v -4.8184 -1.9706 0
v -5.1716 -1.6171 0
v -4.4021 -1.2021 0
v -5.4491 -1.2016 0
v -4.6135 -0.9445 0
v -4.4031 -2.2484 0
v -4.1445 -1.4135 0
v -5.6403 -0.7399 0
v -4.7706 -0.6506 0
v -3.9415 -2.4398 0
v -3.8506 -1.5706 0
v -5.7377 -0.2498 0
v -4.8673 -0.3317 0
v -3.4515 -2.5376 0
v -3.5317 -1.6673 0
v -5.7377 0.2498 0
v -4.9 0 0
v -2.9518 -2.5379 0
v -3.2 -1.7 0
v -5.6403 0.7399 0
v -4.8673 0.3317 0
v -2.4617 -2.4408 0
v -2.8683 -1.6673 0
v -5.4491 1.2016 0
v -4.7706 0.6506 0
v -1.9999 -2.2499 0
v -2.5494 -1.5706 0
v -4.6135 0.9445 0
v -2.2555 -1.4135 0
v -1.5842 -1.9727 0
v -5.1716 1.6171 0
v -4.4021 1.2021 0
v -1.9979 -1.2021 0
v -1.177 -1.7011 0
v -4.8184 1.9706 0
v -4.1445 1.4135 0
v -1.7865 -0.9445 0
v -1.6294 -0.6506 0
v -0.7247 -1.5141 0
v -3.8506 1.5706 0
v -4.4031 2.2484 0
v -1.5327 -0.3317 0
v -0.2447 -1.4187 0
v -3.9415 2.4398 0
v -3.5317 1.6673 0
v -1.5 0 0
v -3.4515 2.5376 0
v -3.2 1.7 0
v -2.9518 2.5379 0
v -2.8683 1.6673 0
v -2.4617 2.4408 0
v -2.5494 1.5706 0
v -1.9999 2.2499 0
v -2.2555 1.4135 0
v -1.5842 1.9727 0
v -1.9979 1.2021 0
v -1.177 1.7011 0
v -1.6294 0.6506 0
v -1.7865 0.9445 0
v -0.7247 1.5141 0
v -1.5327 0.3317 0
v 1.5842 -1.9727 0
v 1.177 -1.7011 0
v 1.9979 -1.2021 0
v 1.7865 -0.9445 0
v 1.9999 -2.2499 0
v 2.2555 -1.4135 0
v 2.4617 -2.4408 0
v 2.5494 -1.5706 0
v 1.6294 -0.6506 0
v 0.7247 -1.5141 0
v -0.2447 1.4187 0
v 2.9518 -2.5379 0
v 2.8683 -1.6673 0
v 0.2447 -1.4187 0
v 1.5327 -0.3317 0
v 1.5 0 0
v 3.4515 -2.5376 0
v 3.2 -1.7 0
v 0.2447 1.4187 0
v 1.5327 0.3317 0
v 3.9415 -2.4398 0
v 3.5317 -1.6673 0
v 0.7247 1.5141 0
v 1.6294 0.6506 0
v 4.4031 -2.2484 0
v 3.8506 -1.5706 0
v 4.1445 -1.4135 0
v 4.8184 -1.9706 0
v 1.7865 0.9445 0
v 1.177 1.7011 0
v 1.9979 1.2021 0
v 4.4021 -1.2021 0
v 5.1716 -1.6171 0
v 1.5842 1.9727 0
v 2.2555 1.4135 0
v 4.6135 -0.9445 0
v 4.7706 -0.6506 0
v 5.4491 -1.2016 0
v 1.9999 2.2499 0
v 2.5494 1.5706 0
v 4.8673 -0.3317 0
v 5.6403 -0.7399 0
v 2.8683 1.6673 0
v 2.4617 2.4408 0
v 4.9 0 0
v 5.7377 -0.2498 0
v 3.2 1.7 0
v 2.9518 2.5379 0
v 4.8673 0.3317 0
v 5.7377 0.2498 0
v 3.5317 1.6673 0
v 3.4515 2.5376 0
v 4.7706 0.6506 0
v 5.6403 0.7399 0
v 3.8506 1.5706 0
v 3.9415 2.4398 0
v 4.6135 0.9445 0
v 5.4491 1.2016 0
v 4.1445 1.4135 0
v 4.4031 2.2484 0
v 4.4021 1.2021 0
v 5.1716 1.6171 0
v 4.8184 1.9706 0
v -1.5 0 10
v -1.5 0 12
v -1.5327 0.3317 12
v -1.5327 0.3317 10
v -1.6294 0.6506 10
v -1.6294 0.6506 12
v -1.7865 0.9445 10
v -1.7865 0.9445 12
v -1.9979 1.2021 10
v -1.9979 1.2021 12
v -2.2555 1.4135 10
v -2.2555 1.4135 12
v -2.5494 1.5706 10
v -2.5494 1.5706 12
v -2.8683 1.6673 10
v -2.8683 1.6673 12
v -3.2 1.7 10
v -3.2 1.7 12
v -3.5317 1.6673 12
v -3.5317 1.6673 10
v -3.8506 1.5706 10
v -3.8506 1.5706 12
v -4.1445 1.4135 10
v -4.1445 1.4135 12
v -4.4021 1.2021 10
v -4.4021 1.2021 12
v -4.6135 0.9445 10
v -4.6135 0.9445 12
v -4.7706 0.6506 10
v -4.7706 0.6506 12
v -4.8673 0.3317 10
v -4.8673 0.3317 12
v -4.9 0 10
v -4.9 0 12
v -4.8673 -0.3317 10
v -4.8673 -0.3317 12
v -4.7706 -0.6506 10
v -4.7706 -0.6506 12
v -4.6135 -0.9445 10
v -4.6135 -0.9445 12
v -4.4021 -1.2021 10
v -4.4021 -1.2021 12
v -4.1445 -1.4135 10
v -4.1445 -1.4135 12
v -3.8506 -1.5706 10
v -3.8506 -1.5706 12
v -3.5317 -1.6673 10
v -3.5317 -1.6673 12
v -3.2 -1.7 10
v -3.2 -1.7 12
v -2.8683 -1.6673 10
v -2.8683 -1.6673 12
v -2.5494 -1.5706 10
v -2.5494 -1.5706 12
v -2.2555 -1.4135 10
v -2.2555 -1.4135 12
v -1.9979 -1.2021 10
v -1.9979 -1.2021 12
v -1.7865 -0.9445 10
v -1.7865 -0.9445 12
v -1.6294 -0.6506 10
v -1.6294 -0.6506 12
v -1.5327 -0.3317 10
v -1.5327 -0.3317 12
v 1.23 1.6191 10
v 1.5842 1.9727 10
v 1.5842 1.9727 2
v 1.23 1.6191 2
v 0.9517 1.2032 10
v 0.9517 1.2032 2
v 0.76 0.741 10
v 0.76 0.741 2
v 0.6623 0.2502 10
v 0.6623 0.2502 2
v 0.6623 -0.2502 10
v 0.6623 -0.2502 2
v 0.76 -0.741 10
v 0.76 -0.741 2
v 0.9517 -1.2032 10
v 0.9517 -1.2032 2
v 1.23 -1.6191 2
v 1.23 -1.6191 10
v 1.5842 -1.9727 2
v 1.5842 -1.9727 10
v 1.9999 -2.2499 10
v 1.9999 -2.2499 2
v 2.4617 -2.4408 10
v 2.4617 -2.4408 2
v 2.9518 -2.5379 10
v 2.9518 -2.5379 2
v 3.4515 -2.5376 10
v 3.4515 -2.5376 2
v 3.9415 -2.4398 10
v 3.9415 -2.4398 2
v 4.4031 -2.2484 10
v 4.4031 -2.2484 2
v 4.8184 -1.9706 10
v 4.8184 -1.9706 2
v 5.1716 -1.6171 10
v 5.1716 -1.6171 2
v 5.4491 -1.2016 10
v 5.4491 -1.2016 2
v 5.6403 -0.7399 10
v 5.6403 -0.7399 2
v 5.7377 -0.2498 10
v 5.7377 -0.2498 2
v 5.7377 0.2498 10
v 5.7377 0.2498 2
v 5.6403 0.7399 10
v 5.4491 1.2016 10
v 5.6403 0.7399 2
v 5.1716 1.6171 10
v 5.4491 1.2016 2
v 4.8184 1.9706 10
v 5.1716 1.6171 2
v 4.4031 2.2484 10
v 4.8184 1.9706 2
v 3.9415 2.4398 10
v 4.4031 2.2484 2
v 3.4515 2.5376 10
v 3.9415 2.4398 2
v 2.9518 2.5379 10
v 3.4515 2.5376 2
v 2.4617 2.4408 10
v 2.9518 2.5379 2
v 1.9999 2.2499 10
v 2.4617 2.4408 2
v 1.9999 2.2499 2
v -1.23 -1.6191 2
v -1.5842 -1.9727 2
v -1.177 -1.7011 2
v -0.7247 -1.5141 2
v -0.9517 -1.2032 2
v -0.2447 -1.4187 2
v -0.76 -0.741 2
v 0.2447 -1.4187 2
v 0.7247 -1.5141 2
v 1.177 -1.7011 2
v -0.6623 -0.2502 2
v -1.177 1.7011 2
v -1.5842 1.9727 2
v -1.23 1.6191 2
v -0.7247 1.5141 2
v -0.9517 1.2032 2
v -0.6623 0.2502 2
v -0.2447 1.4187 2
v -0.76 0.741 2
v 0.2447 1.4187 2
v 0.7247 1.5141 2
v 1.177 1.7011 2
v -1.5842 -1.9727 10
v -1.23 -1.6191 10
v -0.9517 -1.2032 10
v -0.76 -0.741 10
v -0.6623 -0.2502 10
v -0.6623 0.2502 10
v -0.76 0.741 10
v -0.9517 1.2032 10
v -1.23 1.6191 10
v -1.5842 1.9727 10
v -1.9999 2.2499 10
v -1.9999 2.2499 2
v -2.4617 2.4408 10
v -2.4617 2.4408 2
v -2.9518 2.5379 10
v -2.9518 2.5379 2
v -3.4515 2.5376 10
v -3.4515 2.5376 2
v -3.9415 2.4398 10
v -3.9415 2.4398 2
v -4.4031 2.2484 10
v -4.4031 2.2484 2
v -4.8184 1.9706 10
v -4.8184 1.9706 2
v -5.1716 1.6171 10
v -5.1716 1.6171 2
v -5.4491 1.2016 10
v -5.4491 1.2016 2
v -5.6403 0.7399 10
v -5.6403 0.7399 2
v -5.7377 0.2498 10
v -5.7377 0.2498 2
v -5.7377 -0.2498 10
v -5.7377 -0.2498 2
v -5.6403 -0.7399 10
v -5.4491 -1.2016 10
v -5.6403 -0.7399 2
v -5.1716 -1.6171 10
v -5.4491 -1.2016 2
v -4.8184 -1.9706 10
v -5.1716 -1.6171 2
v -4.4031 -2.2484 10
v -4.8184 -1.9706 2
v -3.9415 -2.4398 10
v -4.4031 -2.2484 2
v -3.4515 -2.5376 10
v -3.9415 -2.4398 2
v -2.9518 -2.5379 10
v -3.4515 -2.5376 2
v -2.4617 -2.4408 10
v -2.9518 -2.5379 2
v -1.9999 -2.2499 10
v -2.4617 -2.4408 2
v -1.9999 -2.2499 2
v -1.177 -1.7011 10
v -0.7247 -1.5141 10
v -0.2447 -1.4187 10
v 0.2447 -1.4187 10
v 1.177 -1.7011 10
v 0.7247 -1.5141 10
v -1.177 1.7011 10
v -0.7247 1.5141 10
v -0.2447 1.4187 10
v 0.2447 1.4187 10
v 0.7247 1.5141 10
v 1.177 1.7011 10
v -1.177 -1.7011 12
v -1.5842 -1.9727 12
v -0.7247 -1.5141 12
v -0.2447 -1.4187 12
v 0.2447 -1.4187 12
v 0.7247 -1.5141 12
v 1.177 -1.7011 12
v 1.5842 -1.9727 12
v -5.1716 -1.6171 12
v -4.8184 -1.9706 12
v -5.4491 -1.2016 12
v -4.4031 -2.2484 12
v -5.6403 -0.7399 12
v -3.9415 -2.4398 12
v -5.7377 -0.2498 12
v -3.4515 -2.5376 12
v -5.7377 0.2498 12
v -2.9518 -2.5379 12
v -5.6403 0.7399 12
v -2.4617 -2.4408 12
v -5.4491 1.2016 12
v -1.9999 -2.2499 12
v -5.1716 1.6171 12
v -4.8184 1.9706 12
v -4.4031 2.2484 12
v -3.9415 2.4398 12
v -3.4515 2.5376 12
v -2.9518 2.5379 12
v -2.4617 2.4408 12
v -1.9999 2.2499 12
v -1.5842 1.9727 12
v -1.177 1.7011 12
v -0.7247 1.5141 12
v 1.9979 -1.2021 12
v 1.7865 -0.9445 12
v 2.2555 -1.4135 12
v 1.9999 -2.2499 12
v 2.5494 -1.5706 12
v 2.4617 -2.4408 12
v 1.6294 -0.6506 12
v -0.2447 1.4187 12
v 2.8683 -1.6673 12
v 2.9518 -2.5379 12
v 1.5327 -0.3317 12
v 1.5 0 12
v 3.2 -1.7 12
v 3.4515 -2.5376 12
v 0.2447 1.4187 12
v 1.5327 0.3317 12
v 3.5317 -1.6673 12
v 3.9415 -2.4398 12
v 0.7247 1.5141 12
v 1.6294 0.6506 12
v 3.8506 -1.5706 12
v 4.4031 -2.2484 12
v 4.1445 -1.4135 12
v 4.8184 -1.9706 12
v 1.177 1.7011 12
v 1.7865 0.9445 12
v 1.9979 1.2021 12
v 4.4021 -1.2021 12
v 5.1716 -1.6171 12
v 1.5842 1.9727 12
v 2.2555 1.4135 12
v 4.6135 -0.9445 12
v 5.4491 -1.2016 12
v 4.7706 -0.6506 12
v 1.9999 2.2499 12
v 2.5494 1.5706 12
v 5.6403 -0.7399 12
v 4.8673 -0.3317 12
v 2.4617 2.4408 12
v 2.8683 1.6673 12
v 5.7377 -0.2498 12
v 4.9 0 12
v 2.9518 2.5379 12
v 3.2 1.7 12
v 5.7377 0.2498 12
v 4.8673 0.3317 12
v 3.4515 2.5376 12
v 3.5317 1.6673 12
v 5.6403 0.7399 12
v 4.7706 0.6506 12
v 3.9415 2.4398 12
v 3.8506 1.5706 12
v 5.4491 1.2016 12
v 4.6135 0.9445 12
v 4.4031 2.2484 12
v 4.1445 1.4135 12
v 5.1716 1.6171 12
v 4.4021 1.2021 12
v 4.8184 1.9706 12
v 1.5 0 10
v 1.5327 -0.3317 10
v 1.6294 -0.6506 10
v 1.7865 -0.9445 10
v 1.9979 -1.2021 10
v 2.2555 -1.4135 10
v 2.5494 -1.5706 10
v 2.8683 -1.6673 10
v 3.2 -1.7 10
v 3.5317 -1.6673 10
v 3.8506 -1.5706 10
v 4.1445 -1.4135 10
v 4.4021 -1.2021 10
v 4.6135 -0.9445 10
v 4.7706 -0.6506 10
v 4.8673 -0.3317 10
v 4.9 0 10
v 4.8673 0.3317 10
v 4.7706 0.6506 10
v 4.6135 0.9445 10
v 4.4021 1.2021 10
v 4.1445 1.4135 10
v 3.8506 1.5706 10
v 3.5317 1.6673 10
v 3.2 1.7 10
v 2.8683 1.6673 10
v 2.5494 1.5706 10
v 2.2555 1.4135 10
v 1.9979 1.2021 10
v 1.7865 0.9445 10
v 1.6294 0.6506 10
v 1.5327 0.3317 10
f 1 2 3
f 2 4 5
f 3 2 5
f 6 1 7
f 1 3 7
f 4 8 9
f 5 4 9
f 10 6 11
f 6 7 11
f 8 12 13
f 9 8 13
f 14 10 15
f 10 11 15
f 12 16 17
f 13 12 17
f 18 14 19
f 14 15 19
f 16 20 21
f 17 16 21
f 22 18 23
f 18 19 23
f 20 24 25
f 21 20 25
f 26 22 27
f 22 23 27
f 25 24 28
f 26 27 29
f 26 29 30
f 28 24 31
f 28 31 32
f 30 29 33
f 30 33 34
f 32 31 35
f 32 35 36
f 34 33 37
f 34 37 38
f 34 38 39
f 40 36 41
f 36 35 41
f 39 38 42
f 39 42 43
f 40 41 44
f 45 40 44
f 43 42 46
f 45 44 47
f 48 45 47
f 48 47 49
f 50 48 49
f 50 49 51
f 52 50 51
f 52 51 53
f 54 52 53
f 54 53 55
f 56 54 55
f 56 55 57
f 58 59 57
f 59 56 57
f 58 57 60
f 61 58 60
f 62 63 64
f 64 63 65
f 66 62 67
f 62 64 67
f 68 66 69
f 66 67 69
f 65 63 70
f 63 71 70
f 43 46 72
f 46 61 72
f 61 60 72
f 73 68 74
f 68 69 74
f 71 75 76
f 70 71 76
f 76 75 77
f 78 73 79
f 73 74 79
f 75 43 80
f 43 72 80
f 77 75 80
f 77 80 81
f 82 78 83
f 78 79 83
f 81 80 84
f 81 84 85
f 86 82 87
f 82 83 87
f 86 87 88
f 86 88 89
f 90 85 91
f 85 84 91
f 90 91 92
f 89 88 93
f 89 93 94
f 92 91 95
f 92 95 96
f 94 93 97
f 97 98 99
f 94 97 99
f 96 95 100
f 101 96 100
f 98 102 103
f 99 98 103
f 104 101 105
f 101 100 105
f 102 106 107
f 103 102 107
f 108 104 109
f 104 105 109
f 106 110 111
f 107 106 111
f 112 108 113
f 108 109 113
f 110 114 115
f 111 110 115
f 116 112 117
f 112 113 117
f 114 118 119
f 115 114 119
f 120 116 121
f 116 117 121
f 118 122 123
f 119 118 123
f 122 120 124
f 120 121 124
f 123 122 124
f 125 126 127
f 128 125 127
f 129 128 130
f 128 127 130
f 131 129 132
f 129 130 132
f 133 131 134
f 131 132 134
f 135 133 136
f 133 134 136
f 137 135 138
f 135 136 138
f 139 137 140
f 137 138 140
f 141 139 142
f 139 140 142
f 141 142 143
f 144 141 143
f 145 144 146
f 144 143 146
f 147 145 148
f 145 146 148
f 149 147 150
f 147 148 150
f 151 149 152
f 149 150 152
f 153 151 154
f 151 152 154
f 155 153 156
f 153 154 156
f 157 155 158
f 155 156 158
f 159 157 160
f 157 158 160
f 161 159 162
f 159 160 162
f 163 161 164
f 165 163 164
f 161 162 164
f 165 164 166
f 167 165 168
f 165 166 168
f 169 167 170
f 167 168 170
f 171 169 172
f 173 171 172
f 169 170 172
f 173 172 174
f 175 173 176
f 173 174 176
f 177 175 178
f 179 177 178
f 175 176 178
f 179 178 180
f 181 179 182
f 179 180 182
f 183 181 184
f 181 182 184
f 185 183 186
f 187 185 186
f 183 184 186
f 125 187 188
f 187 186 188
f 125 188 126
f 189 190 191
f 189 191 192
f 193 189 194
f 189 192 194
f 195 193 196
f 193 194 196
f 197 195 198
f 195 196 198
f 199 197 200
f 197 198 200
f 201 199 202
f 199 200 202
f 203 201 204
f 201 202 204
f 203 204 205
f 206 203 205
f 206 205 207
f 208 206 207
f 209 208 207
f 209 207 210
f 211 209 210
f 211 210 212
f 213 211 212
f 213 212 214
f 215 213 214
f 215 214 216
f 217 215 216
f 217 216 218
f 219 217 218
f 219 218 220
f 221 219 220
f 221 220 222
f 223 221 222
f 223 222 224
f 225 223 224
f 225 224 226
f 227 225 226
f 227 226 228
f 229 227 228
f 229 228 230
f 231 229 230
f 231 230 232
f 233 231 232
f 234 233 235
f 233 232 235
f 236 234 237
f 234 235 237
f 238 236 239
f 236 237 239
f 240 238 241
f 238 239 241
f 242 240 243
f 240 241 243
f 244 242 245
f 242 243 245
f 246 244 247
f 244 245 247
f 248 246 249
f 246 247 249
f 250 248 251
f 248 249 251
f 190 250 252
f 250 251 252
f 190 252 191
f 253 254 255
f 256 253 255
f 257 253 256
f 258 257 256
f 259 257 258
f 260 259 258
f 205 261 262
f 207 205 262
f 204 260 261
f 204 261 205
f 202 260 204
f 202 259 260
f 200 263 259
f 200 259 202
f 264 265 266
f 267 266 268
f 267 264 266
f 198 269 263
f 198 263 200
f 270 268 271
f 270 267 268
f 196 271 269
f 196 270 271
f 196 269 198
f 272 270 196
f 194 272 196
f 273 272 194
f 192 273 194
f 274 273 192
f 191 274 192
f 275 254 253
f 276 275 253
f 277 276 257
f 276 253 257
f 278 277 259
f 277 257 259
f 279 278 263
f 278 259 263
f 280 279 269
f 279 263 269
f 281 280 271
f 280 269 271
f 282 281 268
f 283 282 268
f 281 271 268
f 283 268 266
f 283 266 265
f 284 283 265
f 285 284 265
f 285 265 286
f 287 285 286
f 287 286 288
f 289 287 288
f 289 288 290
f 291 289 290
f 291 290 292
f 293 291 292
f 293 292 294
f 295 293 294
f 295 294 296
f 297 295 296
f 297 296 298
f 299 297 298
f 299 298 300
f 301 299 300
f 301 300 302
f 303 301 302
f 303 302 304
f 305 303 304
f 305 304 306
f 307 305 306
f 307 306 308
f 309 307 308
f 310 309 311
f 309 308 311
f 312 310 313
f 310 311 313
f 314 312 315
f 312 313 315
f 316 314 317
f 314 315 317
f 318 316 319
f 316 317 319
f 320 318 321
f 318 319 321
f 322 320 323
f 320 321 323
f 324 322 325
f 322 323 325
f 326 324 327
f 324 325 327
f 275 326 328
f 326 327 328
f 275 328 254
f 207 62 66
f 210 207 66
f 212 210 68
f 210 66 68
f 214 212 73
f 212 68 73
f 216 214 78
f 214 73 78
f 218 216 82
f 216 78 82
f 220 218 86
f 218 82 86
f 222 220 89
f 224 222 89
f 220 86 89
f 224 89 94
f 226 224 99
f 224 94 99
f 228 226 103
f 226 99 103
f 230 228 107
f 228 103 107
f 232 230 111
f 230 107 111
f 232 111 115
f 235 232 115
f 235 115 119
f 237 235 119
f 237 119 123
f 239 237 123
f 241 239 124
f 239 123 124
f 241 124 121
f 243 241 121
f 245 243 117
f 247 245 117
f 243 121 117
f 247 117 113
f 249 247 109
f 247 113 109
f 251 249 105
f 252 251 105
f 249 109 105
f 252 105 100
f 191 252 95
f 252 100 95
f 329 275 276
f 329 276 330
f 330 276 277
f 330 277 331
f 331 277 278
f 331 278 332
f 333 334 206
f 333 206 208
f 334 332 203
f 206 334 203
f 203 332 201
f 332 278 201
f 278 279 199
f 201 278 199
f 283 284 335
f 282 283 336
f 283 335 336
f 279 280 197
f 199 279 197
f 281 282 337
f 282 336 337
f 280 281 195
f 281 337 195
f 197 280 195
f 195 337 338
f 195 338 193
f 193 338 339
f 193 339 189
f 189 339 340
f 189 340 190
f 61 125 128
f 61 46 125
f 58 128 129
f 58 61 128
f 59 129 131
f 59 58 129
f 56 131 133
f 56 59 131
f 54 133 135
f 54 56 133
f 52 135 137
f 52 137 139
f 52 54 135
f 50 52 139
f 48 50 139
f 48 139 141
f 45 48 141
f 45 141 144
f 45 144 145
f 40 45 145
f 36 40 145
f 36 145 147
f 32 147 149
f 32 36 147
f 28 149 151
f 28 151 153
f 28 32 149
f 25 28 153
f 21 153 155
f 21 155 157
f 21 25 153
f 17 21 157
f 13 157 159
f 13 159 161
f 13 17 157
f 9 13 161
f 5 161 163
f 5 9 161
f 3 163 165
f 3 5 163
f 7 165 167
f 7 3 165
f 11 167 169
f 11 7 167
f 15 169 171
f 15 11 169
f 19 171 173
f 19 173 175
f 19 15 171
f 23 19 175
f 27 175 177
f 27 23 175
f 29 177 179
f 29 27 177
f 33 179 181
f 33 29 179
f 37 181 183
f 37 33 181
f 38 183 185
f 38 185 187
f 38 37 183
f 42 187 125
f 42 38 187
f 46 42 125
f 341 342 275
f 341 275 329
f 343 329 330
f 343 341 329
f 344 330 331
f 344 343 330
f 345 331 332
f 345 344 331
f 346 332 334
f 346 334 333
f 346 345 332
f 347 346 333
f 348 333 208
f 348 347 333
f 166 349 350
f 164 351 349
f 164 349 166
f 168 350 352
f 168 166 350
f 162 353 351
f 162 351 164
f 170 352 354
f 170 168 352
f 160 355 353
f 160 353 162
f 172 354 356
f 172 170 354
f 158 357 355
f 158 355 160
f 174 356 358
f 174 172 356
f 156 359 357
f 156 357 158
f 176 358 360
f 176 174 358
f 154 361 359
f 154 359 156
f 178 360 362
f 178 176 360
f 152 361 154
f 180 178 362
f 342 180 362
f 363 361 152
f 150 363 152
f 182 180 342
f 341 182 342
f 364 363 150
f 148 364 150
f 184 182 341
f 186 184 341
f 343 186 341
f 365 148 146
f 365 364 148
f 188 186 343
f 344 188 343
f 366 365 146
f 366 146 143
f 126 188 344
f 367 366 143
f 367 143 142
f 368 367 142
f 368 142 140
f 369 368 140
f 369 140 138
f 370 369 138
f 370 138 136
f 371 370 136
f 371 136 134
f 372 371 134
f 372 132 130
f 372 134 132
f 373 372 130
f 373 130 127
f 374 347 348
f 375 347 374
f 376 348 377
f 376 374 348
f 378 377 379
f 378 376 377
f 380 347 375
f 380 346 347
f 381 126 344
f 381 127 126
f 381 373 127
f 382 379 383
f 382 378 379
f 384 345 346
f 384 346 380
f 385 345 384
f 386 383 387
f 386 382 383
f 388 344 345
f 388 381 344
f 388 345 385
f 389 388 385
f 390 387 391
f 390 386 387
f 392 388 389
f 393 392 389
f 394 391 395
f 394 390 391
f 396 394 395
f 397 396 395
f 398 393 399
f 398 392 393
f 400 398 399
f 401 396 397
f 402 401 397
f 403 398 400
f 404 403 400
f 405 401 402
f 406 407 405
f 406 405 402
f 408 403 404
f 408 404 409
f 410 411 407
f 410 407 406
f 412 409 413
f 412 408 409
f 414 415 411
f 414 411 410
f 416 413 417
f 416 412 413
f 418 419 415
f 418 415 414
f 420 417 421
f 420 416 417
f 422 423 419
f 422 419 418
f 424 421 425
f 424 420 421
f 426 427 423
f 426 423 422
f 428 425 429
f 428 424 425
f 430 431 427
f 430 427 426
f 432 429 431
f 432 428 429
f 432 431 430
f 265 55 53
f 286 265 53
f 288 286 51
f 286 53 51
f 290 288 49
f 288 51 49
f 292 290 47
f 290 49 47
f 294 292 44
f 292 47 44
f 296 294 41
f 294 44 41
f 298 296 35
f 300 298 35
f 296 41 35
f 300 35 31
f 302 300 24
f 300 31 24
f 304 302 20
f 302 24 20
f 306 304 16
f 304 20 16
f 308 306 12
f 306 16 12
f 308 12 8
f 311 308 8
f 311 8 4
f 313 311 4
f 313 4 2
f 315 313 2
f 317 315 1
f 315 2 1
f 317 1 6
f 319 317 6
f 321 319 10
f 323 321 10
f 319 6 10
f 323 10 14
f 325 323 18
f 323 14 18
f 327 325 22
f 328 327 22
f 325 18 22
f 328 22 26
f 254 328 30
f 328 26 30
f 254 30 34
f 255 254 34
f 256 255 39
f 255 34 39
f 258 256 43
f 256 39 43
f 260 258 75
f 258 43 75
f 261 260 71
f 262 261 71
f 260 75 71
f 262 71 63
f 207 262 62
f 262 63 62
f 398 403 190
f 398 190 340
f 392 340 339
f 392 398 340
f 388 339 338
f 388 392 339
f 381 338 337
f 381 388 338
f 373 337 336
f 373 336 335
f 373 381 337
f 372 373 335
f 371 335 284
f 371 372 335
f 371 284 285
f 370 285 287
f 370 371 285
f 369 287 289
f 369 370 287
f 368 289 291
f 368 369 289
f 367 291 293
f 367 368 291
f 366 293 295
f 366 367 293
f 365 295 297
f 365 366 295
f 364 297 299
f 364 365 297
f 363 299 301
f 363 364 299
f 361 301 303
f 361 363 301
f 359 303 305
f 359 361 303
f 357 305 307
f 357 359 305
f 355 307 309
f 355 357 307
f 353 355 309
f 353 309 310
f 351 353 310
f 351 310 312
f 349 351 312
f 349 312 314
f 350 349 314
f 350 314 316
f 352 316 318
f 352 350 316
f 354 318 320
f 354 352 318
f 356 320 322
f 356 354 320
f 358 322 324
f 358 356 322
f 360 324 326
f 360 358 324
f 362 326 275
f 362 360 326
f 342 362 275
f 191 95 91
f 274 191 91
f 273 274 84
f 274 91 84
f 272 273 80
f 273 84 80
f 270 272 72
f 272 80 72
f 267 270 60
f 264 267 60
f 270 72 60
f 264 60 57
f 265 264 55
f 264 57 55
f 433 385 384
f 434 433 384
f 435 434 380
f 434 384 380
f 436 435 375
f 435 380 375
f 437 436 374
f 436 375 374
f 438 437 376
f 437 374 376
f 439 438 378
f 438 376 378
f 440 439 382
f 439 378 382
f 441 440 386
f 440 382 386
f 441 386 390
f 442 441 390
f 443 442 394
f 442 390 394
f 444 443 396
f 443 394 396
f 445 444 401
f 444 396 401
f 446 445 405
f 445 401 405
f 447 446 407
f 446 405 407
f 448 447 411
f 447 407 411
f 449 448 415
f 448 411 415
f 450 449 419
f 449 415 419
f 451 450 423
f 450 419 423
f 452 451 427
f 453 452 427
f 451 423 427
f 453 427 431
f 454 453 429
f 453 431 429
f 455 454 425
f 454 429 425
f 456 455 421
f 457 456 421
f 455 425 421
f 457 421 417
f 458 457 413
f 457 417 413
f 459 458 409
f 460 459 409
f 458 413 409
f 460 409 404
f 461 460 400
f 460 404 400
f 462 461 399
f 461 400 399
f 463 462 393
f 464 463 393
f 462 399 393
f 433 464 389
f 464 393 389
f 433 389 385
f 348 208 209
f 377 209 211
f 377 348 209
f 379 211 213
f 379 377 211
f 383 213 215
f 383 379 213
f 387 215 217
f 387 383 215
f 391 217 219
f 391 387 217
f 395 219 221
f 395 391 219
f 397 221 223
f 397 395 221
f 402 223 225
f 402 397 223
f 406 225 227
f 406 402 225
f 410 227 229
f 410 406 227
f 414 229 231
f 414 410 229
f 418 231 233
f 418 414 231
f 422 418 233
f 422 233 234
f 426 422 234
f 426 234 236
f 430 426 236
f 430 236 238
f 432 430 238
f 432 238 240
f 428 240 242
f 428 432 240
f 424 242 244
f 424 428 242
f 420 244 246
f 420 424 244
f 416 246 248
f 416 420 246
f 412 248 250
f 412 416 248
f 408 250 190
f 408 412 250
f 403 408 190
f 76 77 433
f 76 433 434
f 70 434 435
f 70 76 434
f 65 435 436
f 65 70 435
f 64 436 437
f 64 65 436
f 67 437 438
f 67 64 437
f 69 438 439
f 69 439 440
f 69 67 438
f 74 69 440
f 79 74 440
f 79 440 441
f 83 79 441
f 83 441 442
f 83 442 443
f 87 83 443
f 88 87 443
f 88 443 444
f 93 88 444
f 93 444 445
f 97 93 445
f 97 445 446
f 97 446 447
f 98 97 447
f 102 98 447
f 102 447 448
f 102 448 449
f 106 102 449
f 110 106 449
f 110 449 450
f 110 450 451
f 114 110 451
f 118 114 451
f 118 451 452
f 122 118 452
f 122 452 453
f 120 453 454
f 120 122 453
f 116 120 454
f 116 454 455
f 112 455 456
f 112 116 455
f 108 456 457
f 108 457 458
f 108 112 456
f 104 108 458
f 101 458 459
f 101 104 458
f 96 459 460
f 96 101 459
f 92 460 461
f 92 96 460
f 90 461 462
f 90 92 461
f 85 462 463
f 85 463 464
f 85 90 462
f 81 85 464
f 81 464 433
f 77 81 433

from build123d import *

# Parameters (mm, degrees)
CROQUIS1_R              = 1.7
SALIENTE_EXTRUIR1_DEPTH = 2
CROQUIS2_R              = 2.55
CROQUIS2_R_2            = 1.7
SALIENTE_EXTRUIR2_DEPTH = 8


with BuildPart() as part:
    # Croquis1 → Saliente-Extruir1 (new body)
    with BuildSketch(Plane.XY):
        with BuildLine():
            ThreePointArc((-1.584158416, 1.972702708), (-5.75, 0), (-1.584158416, -1.972702708))
            ThreePointArc((-1.584158416, -1.972702708), (0, -1.406724971), (1.584158416, -1.972702708))
            ThreePointArc((1.584158416, -1.972702708), (5.75, 0), (1.584158416, 1.972702708))
            ThreePointArc((1.584158416, 1.972702708), (0, 1.406724971), (-1.584158416, 1.972702708))
        make_face()
        with Locations((-3.2, 0)):
            Circle(CROQUIS1_R, mode=Mode.SUBTRACT)
        with Locations(Location((3.2, 0, 0), (0, 0, 180))):
            Circle(CROQUIS1_R, mode=Mode.SUBTRACT)
    saliente_extruir1 = extrude(amount=SALIENTE_EXTRUIR1_DEPTH)

    # Croquis2 → Saliente-Extruir2 (add)
    # profile 1 of 2: a face of its own
    with BuildSketch(Plane.XY.offset(2)):
        with Locations(Location((-3.2, 0, 0), (0, 0, 309.320919198))):
            Circle(CROQUIS2_R)
        with Locations((-3.2, 0)):
            Circle(CROQUIS2_R_2, mode=Mode.SUBTRACT)
    # profile 2 of 2: a face of its own
    with BuildSketch(Plane.XY.offset(2)):
        with Locations(Location((3.2, 0, 0), (0, 0, 129.320919198))):
            Circle(CROQUIS2_R)
        with Locations(Location((3.2, 0, 0), (0, 0, 180))):
            Circle(CROQUIS2_R_2, mode=Mode.SUBTRACT)
    extrude(amount=SALIENTE_EXTRUIR2_DEPTH)

    # Simetría1: Saliente-Extruir1 across plane
    add(saliente_extruir1.mirror(Plane.XY.offset(6)))


solid = part.part
